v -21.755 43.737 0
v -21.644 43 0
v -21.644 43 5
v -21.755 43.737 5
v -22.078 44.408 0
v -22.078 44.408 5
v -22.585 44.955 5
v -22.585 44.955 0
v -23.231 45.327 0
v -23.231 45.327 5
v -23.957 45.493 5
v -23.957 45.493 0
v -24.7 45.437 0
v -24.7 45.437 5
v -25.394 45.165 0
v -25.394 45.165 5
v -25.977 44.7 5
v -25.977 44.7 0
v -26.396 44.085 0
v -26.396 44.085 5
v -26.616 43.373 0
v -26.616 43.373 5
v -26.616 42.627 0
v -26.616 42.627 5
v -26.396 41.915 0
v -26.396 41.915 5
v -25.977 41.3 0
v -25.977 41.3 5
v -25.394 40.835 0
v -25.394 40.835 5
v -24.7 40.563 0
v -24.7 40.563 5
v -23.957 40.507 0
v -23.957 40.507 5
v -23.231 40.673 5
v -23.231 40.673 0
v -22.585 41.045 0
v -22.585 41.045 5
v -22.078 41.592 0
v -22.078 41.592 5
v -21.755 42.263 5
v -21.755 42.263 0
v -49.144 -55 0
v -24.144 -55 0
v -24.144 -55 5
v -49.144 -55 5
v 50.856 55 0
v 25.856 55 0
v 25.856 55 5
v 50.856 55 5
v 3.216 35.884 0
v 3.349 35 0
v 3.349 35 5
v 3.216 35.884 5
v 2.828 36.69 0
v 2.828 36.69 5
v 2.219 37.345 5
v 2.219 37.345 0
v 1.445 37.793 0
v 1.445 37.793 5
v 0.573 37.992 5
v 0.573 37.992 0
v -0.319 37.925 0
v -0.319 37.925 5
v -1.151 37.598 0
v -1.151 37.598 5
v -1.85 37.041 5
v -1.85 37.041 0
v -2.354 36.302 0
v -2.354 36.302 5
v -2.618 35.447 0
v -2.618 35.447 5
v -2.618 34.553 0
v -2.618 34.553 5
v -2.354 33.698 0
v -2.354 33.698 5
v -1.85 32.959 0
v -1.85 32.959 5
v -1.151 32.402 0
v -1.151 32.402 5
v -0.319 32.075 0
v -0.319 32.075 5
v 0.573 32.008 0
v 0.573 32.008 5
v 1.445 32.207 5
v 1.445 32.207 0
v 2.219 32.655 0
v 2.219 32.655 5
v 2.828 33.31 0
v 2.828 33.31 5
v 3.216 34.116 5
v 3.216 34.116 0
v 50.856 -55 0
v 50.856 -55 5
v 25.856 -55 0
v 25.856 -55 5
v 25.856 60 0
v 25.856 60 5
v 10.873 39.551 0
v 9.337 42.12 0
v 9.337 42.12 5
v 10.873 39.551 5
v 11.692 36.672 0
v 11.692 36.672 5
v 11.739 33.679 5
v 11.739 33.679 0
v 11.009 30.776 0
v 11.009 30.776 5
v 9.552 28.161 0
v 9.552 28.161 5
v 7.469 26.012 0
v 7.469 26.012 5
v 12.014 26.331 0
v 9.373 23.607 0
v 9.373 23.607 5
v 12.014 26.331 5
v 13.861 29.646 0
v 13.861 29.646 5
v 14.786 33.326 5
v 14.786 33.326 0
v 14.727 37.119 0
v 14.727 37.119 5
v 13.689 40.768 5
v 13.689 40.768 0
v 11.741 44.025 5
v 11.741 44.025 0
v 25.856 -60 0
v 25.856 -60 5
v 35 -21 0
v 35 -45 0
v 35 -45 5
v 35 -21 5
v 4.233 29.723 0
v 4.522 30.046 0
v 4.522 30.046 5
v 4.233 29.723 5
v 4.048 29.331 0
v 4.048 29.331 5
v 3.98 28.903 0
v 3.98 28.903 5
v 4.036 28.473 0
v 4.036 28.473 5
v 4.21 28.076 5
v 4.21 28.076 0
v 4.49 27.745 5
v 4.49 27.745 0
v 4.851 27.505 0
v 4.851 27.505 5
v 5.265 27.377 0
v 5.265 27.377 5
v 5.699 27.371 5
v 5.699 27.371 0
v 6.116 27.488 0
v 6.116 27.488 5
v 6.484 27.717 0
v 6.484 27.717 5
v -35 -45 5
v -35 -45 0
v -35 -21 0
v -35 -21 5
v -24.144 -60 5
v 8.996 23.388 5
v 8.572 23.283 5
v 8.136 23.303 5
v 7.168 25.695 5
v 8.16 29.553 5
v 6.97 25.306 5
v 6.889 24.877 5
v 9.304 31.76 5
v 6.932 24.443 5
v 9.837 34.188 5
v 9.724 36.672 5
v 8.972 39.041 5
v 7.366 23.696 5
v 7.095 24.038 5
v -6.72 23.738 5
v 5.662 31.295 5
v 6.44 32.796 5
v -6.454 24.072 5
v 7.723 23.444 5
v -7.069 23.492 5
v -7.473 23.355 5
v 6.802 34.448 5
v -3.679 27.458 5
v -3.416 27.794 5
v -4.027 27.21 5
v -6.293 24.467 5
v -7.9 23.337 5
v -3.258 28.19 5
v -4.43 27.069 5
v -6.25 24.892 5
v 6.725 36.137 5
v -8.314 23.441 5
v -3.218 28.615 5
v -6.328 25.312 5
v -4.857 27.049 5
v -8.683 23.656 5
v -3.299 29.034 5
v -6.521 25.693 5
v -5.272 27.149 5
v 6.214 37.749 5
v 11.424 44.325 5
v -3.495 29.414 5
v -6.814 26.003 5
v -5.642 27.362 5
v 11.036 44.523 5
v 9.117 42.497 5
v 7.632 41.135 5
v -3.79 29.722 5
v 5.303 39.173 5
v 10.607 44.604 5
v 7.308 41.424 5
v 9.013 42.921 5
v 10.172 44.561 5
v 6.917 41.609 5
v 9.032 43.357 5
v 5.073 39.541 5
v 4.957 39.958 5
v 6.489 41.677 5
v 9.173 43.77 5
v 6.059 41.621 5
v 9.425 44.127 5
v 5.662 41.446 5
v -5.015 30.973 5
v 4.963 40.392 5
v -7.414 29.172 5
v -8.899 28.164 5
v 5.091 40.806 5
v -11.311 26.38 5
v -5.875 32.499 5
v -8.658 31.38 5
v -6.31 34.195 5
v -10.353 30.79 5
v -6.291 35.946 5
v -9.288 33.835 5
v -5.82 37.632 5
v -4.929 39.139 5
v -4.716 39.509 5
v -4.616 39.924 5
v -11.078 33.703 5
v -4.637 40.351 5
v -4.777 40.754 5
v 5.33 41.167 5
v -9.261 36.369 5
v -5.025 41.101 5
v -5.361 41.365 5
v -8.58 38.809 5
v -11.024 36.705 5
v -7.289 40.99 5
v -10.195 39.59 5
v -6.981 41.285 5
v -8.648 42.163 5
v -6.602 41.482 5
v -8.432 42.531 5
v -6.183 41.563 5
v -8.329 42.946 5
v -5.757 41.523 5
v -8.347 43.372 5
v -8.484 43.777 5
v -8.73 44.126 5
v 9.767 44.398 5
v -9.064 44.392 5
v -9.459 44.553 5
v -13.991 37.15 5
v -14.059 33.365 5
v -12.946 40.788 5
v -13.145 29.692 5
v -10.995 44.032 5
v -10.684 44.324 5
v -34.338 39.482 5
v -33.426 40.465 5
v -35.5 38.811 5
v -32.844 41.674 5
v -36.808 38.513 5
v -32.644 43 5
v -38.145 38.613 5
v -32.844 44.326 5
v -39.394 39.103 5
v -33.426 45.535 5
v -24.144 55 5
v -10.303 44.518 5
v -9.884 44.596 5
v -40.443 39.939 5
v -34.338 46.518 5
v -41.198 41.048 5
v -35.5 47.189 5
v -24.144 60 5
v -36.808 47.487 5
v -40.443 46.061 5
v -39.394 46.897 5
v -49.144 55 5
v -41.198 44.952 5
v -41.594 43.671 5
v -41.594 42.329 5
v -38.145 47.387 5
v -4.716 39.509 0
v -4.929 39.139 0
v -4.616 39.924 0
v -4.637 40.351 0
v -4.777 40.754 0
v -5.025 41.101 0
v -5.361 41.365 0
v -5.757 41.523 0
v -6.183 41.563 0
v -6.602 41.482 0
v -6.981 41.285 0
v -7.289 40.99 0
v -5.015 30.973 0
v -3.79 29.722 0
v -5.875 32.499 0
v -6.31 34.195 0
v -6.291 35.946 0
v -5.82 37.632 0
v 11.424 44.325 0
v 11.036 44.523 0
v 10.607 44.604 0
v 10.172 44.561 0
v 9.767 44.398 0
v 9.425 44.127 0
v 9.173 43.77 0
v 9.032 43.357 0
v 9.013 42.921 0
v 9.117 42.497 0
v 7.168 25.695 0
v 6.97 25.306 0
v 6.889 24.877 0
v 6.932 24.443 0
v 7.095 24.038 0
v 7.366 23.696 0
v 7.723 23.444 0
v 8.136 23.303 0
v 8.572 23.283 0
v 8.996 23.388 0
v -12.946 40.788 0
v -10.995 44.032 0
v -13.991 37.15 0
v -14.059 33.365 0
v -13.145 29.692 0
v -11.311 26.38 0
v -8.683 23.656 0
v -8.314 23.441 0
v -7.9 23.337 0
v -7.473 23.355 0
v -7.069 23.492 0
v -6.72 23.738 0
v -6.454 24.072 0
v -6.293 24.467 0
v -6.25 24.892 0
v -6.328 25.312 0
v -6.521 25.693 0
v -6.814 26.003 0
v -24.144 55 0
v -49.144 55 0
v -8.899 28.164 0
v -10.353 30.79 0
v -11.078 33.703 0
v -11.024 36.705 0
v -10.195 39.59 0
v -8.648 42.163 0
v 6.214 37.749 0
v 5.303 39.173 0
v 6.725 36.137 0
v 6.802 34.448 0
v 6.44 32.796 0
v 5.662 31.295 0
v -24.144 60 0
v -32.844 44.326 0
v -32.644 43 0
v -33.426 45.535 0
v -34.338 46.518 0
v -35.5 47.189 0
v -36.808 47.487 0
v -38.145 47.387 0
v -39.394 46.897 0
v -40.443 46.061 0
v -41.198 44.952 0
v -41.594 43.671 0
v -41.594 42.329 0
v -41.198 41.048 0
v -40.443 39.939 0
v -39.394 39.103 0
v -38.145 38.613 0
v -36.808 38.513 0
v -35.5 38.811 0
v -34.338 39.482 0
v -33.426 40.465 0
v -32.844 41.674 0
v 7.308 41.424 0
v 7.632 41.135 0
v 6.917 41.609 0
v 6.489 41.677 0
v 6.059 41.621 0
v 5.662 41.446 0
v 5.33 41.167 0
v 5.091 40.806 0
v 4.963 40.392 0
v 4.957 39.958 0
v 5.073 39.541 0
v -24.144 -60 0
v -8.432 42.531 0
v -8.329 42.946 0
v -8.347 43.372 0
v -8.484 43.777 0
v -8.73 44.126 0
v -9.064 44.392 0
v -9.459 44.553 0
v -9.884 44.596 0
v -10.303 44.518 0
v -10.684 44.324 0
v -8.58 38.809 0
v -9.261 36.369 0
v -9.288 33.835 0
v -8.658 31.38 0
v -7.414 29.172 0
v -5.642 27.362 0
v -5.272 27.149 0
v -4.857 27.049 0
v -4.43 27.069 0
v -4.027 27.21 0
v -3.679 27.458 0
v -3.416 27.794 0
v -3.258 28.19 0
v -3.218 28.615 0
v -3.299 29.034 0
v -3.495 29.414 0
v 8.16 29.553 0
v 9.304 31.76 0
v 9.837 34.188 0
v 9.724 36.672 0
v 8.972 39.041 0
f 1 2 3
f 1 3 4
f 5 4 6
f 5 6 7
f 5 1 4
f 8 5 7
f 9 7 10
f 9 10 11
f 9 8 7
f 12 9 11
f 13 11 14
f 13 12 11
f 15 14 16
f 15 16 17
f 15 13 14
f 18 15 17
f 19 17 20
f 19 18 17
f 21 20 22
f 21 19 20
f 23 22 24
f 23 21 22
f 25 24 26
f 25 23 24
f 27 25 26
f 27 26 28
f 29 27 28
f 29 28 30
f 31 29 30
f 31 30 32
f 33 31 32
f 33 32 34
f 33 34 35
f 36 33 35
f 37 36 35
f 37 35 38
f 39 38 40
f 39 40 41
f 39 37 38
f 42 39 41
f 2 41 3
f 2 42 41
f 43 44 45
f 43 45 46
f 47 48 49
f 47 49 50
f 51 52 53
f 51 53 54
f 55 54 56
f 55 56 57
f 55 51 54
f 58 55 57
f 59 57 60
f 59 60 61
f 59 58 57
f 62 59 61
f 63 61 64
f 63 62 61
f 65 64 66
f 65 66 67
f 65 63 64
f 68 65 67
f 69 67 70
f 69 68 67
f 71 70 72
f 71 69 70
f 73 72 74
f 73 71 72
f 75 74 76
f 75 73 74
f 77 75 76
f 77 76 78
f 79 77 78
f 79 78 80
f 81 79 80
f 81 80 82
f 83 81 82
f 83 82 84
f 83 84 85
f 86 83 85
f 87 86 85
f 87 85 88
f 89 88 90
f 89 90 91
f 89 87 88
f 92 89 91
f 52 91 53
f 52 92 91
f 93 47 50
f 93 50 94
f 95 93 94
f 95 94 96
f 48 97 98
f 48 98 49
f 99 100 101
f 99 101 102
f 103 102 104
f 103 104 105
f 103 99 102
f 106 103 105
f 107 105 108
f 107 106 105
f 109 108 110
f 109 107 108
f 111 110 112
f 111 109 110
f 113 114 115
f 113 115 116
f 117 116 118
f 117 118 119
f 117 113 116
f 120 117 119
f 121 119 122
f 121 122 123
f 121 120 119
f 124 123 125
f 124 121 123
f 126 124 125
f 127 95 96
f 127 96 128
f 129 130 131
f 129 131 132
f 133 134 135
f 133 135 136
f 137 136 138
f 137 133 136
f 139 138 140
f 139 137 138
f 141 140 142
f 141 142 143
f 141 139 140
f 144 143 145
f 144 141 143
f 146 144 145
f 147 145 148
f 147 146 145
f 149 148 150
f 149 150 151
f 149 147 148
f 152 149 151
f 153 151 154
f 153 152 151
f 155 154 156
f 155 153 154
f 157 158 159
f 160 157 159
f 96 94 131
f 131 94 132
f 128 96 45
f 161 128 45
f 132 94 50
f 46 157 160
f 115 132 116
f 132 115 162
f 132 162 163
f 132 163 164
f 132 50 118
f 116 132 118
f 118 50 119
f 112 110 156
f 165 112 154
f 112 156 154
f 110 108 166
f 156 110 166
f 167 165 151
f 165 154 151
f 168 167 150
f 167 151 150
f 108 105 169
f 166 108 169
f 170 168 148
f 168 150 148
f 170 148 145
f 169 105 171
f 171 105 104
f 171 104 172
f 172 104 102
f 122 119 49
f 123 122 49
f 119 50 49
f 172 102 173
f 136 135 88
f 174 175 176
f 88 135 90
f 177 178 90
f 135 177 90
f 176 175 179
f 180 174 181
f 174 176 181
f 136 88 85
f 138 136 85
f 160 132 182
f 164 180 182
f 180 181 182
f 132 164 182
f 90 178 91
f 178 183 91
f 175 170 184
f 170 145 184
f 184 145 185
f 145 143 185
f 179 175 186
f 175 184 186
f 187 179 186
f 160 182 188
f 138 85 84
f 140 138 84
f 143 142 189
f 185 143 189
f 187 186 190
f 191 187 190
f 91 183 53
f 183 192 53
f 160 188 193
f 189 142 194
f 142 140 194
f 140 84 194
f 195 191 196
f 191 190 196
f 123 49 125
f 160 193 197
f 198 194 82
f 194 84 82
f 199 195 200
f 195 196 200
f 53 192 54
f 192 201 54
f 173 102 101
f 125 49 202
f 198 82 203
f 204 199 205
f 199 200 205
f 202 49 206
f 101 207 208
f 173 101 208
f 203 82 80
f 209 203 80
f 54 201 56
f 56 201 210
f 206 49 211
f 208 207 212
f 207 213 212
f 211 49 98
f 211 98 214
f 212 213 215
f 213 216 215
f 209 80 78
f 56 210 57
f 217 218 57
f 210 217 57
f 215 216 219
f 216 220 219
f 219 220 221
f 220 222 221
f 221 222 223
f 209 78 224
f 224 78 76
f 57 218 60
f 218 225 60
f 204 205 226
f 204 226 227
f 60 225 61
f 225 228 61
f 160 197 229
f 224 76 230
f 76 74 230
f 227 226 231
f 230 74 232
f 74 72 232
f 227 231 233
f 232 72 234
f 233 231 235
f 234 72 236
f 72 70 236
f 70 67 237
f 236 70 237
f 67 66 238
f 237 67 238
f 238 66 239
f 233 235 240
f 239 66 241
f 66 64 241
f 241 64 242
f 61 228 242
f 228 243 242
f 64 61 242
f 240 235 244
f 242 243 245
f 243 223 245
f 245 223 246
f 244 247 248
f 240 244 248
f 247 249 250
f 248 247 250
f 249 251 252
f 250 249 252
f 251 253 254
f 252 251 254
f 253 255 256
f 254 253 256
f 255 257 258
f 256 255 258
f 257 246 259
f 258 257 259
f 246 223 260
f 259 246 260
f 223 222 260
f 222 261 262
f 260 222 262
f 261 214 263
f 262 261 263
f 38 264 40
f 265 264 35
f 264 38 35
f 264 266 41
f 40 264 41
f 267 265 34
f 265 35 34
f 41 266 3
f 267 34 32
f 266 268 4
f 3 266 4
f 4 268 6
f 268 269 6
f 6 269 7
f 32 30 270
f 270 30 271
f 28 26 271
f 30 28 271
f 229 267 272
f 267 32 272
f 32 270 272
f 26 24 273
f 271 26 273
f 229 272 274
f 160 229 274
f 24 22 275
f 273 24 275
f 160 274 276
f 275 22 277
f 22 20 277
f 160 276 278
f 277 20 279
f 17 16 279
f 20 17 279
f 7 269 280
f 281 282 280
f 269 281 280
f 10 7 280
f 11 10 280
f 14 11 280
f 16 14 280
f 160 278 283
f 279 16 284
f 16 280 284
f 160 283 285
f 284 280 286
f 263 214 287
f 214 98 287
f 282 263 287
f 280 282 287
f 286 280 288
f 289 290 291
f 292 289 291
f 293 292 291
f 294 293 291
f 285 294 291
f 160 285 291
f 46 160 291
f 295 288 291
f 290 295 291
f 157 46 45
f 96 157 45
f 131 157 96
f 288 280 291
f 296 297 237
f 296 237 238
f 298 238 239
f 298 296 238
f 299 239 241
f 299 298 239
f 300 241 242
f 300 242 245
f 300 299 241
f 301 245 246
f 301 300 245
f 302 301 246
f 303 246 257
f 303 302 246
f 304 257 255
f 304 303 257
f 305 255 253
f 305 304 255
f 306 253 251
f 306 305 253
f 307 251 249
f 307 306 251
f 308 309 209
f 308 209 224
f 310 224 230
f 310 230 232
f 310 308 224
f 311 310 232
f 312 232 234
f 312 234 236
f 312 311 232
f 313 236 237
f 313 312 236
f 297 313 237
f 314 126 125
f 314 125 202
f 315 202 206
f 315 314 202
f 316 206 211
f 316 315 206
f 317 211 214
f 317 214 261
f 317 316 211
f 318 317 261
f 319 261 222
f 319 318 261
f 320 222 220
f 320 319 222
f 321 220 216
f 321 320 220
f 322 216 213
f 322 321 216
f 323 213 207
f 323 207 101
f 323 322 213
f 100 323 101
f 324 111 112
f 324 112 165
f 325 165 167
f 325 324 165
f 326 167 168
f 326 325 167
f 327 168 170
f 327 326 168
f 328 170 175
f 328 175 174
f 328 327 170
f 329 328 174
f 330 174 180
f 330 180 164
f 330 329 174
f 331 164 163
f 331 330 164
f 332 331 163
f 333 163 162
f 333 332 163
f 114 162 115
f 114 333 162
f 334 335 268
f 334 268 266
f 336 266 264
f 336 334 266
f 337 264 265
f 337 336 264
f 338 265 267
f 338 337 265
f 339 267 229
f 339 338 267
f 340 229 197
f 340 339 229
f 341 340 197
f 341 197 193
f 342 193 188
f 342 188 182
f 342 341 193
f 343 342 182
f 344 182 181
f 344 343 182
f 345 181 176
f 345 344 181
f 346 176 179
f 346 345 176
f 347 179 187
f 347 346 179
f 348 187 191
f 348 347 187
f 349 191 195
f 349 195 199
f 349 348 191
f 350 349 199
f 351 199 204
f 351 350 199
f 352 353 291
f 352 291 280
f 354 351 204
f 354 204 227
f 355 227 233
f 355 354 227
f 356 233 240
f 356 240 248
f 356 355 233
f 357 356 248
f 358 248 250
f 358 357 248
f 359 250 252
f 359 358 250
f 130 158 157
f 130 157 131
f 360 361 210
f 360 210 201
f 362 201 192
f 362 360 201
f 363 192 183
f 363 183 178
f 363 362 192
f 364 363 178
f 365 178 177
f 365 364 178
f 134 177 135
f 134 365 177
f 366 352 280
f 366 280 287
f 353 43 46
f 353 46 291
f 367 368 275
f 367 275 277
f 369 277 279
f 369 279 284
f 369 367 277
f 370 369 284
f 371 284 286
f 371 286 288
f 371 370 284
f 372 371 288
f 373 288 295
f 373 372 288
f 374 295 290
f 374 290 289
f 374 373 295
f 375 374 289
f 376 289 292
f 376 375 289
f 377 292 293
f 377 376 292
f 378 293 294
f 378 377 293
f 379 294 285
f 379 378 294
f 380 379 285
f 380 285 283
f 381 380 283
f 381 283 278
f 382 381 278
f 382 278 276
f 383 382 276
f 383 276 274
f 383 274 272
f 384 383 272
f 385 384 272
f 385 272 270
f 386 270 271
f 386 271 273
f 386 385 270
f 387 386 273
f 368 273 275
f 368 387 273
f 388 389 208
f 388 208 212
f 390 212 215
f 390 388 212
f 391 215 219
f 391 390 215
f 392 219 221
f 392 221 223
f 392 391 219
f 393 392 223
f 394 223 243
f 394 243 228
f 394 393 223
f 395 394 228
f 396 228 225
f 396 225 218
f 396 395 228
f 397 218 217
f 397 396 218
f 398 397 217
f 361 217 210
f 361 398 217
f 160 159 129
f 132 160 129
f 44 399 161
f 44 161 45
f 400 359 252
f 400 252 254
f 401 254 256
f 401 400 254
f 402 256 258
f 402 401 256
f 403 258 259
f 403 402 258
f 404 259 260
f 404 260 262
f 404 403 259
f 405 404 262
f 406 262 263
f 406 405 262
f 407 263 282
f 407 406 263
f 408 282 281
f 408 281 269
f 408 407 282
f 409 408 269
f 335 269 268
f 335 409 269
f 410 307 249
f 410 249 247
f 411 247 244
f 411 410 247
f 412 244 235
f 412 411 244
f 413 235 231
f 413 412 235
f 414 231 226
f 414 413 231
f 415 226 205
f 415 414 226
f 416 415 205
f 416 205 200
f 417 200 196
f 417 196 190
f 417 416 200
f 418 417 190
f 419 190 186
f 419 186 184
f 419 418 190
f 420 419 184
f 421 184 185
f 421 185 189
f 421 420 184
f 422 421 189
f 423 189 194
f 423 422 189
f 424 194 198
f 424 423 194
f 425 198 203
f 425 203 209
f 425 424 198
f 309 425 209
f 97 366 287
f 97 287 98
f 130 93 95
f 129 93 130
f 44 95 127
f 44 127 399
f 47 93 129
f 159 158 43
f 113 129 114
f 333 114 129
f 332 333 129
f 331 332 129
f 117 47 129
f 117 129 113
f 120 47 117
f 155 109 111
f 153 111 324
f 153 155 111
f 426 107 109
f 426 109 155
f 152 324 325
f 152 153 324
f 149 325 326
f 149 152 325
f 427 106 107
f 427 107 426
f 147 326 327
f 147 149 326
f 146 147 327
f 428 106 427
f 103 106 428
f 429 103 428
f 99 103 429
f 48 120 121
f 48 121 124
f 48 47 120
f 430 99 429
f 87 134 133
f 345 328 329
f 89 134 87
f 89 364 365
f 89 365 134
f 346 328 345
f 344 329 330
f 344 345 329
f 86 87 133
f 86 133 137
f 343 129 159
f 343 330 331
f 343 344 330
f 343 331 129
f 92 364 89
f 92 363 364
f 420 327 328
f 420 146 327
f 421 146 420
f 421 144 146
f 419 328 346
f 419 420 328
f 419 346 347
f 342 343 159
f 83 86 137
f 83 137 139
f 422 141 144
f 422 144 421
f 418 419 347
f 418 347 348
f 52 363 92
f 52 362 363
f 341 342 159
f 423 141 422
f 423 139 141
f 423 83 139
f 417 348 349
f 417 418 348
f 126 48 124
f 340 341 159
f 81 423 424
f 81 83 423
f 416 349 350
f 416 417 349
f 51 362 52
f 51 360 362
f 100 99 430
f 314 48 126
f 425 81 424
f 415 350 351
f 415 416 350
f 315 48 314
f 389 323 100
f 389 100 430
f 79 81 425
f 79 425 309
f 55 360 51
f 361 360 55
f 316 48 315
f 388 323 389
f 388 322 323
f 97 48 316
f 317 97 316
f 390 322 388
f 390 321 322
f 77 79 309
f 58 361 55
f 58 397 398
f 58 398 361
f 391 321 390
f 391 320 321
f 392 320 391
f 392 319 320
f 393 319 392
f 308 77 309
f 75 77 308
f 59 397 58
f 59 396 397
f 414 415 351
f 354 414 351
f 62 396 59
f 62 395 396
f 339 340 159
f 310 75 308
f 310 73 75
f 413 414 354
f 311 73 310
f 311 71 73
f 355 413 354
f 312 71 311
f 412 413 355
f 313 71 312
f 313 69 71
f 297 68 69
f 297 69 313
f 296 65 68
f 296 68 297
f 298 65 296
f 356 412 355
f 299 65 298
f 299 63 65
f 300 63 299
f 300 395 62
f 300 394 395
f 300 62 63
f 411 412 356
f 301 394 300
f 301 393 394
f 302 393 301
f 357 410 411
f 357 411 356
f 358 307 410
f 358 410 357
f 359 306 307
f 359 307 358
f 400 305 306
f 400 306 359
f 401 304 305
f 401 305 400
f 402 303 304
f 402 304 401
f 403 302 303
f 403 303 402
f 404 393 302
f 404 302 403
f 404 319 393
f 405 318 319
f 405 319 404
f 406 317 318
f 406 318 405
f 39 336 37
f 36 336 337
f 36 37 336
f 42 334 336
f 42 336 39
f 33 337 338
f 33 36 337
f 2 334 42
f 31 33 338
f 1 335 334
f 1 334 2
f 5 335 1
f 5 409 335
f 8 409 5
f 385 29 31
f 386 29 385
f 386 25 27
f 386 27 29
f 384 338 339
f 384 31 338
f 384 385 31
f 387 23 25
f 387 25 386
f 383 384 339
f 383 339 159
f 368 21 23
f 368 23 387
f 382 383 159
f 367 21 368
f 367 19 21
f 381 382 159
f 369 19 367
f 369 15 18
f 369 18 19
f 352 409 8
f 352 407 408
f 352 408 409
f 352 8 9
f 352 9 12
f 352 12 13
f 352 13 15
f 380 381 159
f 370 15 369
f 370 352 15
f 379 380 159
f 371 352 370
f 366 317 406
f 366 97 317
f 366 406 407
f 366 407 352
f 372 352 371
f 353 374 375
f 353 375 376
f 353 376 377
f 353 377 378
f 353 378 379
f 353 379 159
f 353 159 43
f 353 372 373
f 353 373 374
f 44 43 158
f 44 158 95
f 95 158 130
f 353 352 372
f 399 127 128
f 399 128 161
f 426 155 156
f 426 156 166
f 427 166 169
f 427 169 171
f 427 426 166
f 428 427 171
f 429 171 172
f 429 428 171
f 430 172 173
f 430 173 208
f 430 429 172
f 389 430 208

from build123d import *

# Parameters (mm, degrees)
SKETCH1_R           = 4.5
SKETCH1_R_2         = 3
SKETCH1_R_3         = 2.5
SKETCH1_W           = 70
SKETCH1_H           = 24
BOSS_EXTRUDE1_DEPTH = 5


with BuildPart() as part:
    # Sketch1 → Boss-Extrude1 (new body)
    with BuildSketch(Plane.XY):
        Polygon((-24.143882276, 60), (25.856117724, 60), (25.856117724, 55), (50.856117724, 55), (50.856117724, -55), (25.856117724, -55), (25.856117724, -60), (-24.143882276, -60), (-24.143882276, -55), (-49.143882276, -55), (-49.143882276, 55), (-24.143882276, 55), align=None)
        with Locations((-37.143882276, 43)):
            Circle(SKETCH1_R, mode=Mode.SUBTRACT)
        with Locations((0.348837209, 35)):
            Circle(SKETCH1_R_2, mode=Mode.SUBTRACT)
        with Locations((-24.143882276, 43)):
            Circle(SKETCH1_R_3, mode=Mode.SUBTRACT)
        with Locations((0, -33)):
            Rectangle(SKETCH1_W, SKETCH1_H, mode=Mode.SUBTRACT)
        with BuildLine():
            ThreePointArc((6.483996619, 27.71689355), (9.83698399, 34.188278863), (7.631943659, 41.13515941))
            ThreePointArc((7.631943659, 41.13515941), (5.486209752, 41.318729247), (5.302639914, 39.17299534))
            ThreePointArc((5.302639914, 39.17299534), (6.802457997, 34.447885818), (4.521832549, 30.046197295))
            ThreePointArc((4.521832549, 30.046197295), (4.338262711, 27.900463388), (6.483996619, 27.71689355))
        make_face(mode=Mode.SUBTRACT)
        with BuildLine():
            ThreePointArc((-7.289461523, 40.990419638), (-9.288121969, 33.834773518), (-5.641582428, 27.361701268))
            ThreePointArc((-5.641582428, 27.361701268), (-3.535600715, 27.61634027), (-3.790239716, 29.722321983))
            ThreePointArc((-3.790239716, 29.722321983), (-6.309814067, 34.194887447), (-4.928840807, 39.139076925))
            ThreePointArc((-4.928840807, 39.139076925), (-5.183479809, 41.245058639), (-7.289461523, 40.990419638))
        make_face(mode=Mode.SUBTRACT)
        with BuildLine():
            ThreePointArc((-10.994860864, 44.031639609), (-14.058702235, 33.365127781), (-8.6828024, 23.656301927))
            ThreePointArc((-8.6828024, 23.656301927), (-6.575008846, 23.895480389), (-6.814187308, 26.003273942))
            ThreePointArc((-6.814187308, 26.003273942), (-11.077832005, 33.703377206), (-8.647888849, 42.163024517))
            ThreePointArc((-8.647888849, 42.163024517), (-8.887067311, 44.270818071), (-10.994860864, 44.031639609))
        make_face(mode=Mode.SUBTRACT)
        with BuildLine():
            ThreePointArc((9.373364684, 23.607418094), (14.785913704, 33.325532654), (11.741419115, 44.024527475))
            ThreePointArc((11.741419115, 44.024527475), (9.586661553, 44.274444498), (9.33674453, 42.119686935))
            ThreePointArc((9.33674453, 42.119686935), (11.738626336, 33.678968697), (7.468524145, 26.01209268))
            ThreePointArc((7.468524145, 26.01209268), (7.218607122, 23.857335117), (9.373364684, 23.607418094))
        make_face(mode=Mode.SUBTRACT)
    extrude(amount=BOSS_EXTRUDE1_DEPTH)


solid = part.part
